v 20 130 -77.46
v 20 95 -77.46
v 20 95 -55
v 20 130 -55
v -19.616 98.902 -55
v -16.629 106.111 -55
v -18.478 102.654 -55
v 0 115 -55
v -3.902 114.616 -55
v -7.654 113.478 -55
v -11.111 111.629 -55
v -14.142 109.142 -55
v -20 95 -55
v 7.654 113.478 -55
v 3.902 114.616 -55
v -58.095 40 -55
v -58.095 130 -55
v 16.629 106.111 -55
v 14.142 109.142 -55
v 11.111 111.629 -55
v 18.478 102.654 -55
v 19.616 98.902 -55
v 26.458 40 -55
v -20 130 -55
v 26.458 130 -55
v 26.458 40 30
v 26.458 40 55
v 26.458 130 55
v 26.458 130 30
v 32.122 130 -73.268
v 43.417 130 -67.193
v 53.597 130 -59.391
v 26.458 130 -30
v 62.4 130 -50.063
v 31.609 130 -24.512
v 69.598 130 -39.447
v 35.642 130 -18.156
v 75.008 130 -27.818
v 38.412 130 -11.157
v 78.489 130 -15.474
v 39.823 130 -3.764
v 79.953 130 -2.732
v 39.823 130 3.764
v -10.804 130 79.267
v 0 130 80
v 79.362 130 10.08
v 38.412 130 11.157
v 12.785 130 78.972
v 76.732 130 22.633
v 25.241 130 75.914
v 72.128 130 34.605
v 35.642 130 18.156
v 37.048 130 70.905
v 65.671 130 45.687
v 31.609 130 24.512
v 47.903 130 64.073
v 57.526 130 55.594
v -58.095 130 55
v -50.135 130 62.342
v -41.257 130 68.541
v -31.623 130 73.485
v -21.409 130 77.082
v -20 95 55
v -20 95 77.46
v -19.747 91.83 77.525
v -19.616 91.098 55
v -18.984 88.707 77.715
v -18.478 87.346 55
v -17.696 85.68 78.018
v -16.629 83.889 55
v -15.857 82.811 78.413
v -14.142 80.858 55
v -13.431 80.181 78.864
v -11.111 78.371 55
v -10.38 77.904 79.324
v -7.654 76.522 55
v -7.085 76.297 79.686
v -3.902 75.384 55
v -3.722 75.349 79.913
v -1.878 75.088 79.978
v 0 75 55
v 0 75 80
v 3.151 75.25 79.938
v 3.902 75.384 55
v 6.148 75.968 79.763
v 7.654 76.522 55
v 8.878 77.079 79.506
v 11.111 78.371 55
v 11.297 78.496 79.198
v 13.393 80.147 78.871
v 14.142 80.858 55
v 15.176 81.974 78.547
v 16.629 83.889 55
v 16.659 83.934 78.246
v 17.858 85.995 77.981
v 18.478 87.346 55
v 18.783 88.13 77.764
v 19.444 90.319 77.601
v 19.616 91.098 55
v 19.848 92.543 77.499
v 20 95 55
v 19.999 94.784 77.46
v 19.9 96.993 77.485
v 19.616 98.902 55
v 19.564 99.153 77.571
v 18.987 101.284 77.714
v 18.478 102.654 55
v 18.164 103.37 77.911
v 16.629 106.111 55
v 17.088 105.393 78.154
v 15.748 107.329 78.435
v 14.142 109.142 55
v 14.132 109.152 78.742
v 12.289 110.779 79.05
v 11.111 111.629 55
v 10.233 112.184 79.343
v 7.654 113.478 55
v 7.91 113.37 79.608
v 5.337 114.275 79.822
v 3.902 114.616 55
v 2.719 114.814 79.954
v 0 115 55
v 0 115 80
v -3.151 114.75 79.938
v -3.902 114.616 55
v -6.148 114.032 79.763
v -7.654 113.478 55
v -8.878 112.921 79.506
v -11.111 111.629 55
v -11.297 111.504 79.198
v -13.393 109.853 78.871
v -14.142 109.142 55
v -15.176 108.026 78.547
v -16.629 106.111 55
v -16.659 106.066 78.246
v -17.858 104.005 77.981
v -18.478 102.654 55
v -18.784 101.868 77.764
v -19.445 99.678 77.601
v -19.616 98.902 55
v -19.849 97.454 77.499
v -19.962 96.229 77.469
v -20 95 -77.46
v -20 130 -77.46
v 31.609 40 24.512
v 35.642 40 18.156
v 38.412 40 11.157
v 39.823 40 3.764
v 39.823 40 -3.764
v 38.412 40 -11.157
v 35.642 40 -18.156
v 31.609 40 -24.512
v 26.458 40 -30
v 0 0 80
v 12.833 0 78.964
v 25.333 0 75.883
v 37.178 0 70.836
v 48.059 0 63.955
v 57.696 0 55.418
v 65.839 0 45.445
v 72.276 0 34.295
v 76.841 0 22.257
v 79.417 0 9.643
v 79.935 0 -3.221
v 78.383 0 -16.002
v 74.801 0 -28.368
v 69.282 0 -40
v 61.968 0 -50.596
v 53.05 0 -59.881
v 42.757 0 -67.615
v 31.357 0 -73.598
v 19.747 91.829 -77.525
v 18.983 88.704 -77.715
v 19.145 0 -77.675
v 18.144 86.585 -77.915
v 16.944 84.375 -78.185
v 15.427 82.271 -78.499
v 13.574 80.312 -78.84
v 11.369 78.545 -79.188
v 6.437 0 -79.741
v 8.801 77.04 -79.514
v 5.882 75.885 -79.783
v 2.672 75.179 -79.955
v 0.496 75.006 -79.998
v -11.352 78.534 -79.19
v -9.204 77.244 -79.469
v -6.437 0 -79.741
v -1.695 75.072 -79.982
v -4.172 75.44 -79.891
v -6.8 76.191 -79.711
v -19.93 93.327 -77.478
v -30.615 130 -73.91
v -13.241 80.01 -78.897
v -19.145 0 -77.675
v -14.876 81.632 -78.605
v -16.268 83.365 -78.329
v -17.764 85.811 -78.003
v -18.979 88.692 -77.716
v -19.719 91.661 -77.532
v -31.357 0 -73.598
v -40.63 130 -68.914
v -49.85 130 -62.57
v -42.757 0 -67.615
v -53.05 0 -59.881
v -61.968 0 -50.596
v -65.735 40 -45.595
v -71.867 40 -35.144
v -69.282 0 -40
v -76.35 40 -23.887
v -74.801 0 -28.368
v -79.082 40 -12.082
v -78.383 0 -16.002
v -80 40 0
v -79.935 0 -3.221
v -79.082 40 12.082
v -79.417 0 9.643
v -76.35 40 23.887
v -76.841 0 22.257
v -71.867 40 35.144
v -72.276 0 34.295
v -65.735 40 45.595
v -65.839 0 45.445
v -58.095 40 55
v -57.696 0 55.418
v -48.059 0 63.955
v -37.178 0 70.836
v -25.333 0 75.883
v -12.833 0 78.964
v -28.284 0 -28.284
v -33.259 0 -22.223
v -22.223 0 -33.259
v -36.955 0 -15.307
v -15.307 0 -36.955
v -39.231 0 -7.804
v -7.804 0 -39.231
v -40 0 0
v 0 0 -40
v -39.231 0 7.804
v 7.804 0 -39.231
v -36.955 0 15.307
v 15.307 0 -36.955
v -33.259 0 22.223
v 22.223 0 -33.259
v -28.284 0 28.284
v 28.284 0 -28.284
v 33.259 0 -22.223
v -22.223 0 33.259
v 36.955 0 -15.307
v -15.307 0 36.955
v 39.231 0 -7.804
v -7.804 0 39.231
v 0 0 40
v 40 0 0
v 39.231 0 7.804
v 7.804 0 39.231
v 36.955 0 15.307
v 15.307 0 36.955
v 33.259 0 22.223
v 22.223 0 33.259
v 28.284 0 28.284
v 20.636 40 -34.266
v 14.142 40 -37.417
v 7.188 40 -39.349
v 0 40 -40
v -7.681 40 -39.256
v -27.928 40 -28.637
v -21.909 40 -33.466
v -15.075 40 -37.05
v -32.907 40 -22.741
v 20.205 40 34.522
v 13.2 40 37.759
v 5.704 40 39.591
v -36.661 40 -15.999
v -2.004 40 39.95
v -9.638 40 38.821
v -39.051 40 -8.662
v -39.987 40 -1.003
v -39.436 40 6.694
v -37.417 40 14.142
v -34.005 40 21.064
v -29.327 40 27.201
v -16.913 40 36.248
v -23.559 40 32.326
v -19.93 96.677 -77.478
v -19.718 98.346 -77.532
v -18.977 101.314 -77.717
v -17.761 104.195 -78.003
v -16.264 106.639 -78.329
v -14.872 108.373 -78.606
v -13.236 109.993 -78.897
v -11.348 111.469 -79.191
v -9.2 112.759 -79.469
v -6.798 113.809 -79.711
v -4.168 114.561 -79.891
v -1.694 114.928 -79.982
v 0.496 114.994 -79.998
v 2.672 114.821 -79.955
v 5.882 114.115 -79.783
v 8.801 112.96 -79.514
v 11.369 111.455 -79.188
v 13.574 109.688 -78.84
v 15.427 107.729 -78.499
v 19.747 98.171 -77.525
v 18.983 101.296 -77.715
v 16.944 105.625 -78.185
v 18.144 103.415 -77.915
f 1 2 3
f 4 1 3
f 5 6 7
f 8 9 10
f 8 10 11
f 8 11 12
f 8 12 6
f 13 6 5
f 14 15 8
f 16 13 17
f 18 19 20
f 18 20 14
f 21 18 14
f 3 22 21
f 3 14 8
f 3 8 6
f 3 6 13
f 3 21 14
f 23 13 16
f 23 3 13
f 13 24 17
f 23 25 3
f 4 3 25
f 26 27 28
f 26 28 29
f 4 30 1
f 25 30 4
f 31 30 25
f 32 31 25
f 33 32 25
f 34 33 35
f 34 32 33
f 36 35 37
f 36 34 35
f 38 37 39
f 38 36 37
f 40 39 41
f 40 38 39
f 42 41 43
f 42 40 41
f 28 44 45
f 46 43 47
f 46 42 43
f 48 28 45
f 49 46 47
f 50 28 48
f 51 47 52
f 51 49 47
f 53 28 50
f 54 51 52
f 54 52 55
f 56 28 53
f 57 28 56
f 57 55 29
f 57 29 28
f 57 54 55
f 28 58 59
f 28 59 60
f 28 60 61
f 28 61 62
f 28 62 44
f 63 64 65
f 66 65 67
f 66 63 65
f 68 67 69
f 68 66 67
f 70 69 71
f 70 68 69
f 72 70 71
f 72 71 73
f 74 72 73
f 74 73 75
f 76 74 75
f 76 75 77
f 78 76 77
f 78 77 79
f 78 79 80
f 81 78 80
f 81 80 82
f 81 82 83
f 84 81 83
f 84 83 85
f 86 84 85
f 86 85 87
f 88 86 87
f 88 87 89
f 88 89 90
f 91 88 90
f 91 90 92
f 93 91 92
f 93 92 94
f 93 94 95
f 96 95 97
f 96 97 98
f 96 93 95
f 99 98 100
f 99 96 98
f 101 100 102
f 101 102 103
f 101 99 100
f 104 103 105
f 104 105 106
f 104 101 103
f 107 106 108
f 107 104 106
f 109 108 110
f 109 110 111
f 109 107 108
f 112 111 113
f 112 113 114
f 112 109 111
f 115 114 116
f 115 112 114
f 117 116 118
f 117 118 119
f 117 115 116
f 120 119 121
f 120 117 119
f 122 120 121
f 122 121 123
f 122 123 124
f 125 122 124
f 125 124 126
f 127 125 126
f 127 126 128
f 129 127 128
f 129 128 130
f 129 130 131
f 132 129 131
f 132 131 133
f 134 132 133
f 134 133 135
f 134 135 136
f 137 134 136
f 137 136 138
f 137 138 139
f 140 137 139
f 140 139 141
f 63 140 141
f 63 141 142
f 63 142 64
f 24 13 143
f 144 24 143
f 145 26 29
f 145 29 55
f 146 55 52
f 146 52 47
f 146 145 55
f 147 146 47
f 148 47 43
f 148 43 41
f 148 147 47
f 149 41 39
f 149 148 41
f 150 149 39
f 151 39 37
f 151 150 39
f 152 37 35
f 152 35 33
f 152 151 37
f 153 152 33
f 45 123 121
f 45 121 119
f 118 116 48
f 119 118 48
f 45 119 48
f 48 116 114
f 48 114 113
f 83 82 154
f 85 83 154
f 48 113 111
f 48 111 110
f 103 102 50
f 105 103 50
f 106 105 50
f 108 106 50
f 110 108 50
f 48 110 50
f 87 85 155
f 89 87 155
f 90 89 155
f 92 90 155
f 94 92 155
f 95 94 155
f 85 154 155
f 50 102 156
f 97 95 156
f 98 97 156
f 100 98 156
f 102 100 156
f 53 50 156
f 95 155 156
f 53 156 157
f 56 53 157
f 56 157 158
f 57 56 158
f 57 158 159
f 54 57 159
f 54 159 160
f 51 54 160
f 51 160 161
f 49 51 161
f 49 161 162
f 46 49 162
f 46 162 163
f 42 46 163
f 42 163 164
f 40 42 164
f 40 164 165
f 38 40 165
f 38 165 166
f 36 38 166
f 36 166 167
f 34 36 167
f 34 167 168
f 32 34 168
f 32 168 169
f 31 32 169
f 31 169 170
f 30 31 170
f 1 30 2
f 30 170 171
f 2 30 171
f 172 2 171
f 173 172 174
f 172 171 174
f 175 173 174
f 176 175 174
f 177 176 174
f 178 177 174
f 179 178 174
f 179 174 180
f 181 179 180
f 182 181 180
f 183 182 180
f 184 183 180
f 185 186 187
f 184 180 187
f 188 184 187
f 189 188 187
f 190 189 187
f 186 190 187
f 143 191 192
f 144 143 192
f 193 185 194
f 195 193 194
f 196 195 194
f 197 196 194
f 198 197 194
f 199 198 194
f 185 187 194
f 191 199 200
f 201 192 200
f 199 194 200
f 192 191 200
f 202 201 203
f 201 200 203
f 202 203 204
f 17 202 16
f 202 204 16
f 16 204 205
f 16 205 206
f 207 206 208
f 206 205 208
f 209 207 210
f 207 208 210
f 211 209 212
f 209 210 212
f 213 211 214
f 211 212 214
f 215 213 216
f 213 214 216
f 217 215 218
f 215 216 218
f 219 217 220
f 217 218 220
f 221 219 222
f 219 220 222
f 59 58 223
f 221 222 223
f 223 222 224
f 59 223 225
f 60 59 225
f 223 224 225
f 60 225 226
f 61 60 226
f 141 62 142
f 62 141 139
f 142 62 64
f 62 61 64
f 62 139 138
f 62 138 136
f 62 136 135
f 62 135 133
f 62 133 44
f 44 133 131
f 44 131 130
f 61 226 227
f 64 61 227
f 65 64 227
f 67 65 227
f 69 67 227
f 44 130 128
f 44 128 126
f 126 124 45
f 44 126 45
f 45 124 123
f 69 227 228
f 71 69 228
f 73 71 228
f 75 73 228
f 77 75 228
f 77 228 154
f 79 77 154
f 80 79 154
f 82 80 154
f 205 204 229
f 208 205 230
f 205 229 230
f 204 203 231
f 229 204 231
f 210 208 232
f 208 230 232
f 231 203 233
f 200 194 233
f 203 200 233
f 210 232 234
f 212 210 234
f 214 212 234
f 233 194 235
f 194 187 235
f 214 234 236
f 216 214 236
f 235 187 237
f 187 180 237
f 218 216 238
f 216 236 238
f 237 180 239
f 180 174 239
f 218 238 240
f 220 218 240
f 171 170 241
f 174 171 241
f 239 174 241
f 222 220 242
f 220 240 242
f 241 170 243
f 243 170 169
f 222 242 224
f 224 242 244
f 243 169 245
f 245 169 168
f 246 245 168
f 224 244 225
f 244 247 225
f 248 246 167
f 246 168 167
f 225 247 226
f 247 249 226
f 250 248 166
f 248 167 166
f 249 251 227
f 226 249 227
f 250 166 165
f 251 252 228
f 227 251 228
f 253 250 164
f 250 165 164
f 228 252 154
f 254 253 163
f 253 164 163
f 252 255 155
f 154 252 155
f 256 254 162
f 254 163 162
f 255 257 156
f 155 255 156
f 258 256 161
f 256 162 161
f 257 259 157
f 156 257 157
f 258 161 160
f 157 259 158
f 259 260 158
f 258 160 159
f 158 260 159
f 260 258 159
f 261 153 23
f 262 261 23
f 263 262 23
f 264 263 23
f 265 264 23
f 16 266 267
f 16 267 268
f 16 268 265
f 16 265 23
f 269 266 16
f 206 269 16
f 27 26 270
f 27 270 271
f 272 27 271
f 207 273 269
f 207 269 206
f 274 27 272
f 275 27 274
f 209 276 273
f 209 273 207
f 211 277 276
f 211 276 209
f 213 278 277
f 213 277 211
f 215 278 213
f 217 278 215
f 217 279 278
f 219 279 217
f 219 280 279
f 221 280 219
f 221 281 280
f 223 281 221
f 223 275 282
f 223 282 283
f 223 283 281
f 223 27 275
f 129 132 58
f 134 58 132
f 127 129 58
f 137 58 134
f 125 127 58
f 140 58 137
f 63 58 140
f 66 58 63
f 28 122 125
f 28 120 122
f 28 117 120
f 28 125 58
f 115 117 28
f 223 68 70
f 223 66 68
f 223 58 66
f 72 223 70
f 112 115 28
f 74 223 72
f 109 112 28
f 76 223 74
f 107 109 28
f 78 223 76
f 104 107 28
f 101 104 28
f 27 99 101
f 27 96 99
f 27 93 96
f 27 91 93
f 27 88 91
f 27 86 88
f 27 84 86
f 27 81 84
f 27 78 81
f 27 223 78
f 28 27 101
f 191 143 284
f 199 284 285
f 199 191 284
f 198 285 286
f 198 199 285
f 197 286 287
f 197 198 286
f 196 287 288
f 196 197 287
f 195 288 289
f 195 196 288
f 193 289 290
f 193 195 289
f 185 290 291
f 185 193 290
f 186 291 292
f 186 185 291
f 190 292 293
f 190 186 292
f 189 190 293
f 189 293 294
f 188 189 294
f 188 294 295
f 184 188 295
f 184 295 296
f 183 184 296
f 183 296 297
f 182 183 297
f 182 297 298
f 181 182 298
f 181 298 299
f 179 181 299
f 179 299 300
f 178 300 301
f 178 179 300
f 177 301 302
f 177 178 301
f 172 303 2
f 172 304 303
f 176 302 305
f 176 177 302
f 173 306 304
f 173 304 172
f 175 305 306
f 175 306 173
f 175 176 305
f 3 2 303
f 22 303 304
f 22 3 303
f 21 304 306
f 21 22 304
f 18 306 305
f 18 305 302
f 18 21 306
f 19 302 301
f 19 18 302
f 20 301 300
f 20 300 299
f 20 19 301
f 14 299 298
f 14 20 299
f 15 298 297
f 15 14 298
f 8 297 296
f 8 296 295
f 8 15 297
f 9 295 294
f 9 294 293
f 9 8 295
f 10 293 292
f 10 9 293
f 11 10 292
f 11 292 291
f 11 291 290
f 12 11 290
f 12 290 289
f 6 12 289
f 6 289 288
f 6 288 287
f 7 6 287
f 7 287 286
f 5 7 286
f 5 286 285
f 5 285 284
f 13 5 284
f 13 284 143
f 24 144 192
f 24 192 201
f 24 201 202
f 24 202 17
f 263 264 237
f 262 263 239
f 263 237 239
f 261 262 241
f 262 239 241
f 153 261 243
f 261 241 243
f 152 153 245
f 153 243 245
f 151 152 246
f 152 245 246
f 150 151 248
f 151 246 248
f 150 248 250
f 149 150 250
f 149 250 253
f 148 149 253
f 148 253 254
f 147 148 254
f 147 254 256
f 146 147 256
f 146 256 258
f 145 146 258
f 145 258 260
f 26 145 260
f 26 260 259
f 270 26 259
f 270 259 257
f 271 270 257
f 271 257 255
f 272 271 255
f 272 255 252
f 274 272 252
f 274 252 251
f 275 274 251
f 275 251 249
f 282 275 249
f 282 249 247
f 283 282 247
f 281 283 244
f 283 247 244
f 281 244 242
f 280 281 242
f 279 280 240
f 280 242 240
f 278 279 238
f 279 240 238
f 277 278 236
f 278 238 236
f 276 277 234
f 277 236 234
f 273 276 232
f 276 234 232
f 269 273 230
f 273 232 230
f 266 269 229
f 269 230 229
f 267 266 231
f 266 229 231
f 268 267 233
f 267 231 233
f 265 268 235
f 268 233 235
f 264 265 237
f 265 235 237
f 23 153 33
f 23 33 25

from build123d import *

# Parameters (mm, degrees)
SKETCH_1_R               = 80
EXTRUDE_1_DEPTH          = 130
SKETCH_2_R               = 40
CUT_EXTRUDE_1_DEPTH      = 40
CUT_EXTRUDE_3_DEPTH      = 90
SKETCH_4_R               = 20
CUT_EXTRUDE_4_DEPTH      = 173.336879396
CUT_EXTRUDE_4_DEPTH_BACK = 173.336879396
CUT_EXTRUDE_8_REACH      = 174.337
CUT_EXTRUDE_8_END_RADIUS = 20
EXTRUDE_5_REACH          = 205.777
EXTRUDE_5_END_RADIUS     = 80
SKETCH_8_R               = 20


with BuildPart() as part:
    # 草图1 → 凸台-拉伸1 (new body)
    with BuildSketch(Plane(origin=(0, 0, 0), x_dir=(1, 0, 0), z_dir=(0, 1, 0))):
        with Locations(Location((0, 0, 0), (0, 0, 270))):
            Circle(SKETCH_1_R)
    extrude(amount=EXTRUDE_1_DEPTH)

    # 草图2 → 切除-拉伸1 (cut)
    with BuildSketch(Plane.XZ):
        with Locations(Location((0, 0, 0), (0, 0, 270))):
            Circle(SKETCH_2_R)
    extrude(amount=-CUT_EXTRUDE_1_DEPTH, mode=Mode.SUBTRACT)

    # 草图3 → 切除-拉伸3 (cut)
    with BuildSketch(Plane.XZ.offset(-40)):
        with BuildLine():
            Line((-58.094750193, 55), (26.457513111, 55))
            Line((26.457513111, 55), (26.457513111, 30))
            ThreePointArc((26.457513111, 30), (40, 0), (26.457513111, -30))
            Line((26.457513111, -30), (26.457513111, -55))
            Line((26.457513111, -55), (-58.094750193, -55))
            ThreePointArc((-58.094750193, -55), (-80, 0), (-58.094750193, 55))
        make_face()
    extrude(amount=-CUT_EXTRUDE_3_DEPTH, mode=Mode.SUBTRACT)

    # 草图4 → 切除-拉伸4 (cut, two sides)
    with BuildSketch(Plane.XY) as cut_extrude_4_sk:
        with Locations(Location((0, 95, 0), (0, 0, 180))):
            Circle(SKETCH_4_R)
    extrude(amount=CUT_EXTRUDE_4_DEPTH, mode=Mode.SUBTRACT)
    extrude(cut_extrude_4_sk.sketch, amount=-CUT_EXTRUDE_4_DEPTH_BACK, mode=Mode.SUBTRACT)

    # 切除-拉伸8: up to this cylinder (the profile starts outside it)
    cut_extrude_8_end = Plane(origin=(0, 95, -67.091154), z_dir=(0, 0, -1)) * Cylinder(CUT_EXTRUDE_8_END_RADIUS, 389.674, mode=Mode.PRIVATE)
    # 草图7 → 切除-拉伸8 (cut, up to the surface)
    with BuildSketch(Plane(origin=(0, 130, 0), x_dir=(1, 0, 0), z_dir=(0, 1, 0)), mode=Mode.PRIVATE) as cut_extrude_8_sk1:
        with BuildLine():
            Line((20, 55), (-20, 55))
            Line((-20, 55), (-20, 77.459666924))
            ThreePointArc((-20, 77.459666924), (0, 80), (20, 77.459666924))
            Line((20, 77.459666924), (20, 55))
        make_face()
    cut_extrude_8_tool1 = extrude(cut_extrude_8_sk1.sketch, amount=-CUT_EXTRUDE_8_REACH, mode=Mode.PRIVATE) - cut_extrude_8_end
    add(cut_extrude_8_tool1.solids().sort_by_distance((0, 130, -67.091154))[0], mode=Mode.SUBTRACT)

    # 凸台-拉伸5: up to this cylinder (the profile starts inside it)
    extrude_5_end = Plane(origin=(0, 95, 0), z_dir=(0, -1, 0)) * Cylinder(EXTRUDE_5_END_RADIUS, 572.554, mode=Mode.PRIVATE)
    # 草图8 → 凸台-拉伸5 (add, up to the surface)
    with BuildSketch(Plane.XY.offset(-55), mode=Mode.PRIVATE) as extrude_5_sk1:
        with Locations(Location((0, 95, 0), (0, 0, 270))):
            Circle(SKETCH_8_R)
    extrude_5_tool1 = extrude(extrude_5_sk1.sketch, amount=-EXTRUDE_5_REACH, mode=Mode.PRIVATE) & extrude_5_end
    add(extrude_5_tool1.solids().sort_by_distance((0, 95, -55))[0])


solid = part.part
